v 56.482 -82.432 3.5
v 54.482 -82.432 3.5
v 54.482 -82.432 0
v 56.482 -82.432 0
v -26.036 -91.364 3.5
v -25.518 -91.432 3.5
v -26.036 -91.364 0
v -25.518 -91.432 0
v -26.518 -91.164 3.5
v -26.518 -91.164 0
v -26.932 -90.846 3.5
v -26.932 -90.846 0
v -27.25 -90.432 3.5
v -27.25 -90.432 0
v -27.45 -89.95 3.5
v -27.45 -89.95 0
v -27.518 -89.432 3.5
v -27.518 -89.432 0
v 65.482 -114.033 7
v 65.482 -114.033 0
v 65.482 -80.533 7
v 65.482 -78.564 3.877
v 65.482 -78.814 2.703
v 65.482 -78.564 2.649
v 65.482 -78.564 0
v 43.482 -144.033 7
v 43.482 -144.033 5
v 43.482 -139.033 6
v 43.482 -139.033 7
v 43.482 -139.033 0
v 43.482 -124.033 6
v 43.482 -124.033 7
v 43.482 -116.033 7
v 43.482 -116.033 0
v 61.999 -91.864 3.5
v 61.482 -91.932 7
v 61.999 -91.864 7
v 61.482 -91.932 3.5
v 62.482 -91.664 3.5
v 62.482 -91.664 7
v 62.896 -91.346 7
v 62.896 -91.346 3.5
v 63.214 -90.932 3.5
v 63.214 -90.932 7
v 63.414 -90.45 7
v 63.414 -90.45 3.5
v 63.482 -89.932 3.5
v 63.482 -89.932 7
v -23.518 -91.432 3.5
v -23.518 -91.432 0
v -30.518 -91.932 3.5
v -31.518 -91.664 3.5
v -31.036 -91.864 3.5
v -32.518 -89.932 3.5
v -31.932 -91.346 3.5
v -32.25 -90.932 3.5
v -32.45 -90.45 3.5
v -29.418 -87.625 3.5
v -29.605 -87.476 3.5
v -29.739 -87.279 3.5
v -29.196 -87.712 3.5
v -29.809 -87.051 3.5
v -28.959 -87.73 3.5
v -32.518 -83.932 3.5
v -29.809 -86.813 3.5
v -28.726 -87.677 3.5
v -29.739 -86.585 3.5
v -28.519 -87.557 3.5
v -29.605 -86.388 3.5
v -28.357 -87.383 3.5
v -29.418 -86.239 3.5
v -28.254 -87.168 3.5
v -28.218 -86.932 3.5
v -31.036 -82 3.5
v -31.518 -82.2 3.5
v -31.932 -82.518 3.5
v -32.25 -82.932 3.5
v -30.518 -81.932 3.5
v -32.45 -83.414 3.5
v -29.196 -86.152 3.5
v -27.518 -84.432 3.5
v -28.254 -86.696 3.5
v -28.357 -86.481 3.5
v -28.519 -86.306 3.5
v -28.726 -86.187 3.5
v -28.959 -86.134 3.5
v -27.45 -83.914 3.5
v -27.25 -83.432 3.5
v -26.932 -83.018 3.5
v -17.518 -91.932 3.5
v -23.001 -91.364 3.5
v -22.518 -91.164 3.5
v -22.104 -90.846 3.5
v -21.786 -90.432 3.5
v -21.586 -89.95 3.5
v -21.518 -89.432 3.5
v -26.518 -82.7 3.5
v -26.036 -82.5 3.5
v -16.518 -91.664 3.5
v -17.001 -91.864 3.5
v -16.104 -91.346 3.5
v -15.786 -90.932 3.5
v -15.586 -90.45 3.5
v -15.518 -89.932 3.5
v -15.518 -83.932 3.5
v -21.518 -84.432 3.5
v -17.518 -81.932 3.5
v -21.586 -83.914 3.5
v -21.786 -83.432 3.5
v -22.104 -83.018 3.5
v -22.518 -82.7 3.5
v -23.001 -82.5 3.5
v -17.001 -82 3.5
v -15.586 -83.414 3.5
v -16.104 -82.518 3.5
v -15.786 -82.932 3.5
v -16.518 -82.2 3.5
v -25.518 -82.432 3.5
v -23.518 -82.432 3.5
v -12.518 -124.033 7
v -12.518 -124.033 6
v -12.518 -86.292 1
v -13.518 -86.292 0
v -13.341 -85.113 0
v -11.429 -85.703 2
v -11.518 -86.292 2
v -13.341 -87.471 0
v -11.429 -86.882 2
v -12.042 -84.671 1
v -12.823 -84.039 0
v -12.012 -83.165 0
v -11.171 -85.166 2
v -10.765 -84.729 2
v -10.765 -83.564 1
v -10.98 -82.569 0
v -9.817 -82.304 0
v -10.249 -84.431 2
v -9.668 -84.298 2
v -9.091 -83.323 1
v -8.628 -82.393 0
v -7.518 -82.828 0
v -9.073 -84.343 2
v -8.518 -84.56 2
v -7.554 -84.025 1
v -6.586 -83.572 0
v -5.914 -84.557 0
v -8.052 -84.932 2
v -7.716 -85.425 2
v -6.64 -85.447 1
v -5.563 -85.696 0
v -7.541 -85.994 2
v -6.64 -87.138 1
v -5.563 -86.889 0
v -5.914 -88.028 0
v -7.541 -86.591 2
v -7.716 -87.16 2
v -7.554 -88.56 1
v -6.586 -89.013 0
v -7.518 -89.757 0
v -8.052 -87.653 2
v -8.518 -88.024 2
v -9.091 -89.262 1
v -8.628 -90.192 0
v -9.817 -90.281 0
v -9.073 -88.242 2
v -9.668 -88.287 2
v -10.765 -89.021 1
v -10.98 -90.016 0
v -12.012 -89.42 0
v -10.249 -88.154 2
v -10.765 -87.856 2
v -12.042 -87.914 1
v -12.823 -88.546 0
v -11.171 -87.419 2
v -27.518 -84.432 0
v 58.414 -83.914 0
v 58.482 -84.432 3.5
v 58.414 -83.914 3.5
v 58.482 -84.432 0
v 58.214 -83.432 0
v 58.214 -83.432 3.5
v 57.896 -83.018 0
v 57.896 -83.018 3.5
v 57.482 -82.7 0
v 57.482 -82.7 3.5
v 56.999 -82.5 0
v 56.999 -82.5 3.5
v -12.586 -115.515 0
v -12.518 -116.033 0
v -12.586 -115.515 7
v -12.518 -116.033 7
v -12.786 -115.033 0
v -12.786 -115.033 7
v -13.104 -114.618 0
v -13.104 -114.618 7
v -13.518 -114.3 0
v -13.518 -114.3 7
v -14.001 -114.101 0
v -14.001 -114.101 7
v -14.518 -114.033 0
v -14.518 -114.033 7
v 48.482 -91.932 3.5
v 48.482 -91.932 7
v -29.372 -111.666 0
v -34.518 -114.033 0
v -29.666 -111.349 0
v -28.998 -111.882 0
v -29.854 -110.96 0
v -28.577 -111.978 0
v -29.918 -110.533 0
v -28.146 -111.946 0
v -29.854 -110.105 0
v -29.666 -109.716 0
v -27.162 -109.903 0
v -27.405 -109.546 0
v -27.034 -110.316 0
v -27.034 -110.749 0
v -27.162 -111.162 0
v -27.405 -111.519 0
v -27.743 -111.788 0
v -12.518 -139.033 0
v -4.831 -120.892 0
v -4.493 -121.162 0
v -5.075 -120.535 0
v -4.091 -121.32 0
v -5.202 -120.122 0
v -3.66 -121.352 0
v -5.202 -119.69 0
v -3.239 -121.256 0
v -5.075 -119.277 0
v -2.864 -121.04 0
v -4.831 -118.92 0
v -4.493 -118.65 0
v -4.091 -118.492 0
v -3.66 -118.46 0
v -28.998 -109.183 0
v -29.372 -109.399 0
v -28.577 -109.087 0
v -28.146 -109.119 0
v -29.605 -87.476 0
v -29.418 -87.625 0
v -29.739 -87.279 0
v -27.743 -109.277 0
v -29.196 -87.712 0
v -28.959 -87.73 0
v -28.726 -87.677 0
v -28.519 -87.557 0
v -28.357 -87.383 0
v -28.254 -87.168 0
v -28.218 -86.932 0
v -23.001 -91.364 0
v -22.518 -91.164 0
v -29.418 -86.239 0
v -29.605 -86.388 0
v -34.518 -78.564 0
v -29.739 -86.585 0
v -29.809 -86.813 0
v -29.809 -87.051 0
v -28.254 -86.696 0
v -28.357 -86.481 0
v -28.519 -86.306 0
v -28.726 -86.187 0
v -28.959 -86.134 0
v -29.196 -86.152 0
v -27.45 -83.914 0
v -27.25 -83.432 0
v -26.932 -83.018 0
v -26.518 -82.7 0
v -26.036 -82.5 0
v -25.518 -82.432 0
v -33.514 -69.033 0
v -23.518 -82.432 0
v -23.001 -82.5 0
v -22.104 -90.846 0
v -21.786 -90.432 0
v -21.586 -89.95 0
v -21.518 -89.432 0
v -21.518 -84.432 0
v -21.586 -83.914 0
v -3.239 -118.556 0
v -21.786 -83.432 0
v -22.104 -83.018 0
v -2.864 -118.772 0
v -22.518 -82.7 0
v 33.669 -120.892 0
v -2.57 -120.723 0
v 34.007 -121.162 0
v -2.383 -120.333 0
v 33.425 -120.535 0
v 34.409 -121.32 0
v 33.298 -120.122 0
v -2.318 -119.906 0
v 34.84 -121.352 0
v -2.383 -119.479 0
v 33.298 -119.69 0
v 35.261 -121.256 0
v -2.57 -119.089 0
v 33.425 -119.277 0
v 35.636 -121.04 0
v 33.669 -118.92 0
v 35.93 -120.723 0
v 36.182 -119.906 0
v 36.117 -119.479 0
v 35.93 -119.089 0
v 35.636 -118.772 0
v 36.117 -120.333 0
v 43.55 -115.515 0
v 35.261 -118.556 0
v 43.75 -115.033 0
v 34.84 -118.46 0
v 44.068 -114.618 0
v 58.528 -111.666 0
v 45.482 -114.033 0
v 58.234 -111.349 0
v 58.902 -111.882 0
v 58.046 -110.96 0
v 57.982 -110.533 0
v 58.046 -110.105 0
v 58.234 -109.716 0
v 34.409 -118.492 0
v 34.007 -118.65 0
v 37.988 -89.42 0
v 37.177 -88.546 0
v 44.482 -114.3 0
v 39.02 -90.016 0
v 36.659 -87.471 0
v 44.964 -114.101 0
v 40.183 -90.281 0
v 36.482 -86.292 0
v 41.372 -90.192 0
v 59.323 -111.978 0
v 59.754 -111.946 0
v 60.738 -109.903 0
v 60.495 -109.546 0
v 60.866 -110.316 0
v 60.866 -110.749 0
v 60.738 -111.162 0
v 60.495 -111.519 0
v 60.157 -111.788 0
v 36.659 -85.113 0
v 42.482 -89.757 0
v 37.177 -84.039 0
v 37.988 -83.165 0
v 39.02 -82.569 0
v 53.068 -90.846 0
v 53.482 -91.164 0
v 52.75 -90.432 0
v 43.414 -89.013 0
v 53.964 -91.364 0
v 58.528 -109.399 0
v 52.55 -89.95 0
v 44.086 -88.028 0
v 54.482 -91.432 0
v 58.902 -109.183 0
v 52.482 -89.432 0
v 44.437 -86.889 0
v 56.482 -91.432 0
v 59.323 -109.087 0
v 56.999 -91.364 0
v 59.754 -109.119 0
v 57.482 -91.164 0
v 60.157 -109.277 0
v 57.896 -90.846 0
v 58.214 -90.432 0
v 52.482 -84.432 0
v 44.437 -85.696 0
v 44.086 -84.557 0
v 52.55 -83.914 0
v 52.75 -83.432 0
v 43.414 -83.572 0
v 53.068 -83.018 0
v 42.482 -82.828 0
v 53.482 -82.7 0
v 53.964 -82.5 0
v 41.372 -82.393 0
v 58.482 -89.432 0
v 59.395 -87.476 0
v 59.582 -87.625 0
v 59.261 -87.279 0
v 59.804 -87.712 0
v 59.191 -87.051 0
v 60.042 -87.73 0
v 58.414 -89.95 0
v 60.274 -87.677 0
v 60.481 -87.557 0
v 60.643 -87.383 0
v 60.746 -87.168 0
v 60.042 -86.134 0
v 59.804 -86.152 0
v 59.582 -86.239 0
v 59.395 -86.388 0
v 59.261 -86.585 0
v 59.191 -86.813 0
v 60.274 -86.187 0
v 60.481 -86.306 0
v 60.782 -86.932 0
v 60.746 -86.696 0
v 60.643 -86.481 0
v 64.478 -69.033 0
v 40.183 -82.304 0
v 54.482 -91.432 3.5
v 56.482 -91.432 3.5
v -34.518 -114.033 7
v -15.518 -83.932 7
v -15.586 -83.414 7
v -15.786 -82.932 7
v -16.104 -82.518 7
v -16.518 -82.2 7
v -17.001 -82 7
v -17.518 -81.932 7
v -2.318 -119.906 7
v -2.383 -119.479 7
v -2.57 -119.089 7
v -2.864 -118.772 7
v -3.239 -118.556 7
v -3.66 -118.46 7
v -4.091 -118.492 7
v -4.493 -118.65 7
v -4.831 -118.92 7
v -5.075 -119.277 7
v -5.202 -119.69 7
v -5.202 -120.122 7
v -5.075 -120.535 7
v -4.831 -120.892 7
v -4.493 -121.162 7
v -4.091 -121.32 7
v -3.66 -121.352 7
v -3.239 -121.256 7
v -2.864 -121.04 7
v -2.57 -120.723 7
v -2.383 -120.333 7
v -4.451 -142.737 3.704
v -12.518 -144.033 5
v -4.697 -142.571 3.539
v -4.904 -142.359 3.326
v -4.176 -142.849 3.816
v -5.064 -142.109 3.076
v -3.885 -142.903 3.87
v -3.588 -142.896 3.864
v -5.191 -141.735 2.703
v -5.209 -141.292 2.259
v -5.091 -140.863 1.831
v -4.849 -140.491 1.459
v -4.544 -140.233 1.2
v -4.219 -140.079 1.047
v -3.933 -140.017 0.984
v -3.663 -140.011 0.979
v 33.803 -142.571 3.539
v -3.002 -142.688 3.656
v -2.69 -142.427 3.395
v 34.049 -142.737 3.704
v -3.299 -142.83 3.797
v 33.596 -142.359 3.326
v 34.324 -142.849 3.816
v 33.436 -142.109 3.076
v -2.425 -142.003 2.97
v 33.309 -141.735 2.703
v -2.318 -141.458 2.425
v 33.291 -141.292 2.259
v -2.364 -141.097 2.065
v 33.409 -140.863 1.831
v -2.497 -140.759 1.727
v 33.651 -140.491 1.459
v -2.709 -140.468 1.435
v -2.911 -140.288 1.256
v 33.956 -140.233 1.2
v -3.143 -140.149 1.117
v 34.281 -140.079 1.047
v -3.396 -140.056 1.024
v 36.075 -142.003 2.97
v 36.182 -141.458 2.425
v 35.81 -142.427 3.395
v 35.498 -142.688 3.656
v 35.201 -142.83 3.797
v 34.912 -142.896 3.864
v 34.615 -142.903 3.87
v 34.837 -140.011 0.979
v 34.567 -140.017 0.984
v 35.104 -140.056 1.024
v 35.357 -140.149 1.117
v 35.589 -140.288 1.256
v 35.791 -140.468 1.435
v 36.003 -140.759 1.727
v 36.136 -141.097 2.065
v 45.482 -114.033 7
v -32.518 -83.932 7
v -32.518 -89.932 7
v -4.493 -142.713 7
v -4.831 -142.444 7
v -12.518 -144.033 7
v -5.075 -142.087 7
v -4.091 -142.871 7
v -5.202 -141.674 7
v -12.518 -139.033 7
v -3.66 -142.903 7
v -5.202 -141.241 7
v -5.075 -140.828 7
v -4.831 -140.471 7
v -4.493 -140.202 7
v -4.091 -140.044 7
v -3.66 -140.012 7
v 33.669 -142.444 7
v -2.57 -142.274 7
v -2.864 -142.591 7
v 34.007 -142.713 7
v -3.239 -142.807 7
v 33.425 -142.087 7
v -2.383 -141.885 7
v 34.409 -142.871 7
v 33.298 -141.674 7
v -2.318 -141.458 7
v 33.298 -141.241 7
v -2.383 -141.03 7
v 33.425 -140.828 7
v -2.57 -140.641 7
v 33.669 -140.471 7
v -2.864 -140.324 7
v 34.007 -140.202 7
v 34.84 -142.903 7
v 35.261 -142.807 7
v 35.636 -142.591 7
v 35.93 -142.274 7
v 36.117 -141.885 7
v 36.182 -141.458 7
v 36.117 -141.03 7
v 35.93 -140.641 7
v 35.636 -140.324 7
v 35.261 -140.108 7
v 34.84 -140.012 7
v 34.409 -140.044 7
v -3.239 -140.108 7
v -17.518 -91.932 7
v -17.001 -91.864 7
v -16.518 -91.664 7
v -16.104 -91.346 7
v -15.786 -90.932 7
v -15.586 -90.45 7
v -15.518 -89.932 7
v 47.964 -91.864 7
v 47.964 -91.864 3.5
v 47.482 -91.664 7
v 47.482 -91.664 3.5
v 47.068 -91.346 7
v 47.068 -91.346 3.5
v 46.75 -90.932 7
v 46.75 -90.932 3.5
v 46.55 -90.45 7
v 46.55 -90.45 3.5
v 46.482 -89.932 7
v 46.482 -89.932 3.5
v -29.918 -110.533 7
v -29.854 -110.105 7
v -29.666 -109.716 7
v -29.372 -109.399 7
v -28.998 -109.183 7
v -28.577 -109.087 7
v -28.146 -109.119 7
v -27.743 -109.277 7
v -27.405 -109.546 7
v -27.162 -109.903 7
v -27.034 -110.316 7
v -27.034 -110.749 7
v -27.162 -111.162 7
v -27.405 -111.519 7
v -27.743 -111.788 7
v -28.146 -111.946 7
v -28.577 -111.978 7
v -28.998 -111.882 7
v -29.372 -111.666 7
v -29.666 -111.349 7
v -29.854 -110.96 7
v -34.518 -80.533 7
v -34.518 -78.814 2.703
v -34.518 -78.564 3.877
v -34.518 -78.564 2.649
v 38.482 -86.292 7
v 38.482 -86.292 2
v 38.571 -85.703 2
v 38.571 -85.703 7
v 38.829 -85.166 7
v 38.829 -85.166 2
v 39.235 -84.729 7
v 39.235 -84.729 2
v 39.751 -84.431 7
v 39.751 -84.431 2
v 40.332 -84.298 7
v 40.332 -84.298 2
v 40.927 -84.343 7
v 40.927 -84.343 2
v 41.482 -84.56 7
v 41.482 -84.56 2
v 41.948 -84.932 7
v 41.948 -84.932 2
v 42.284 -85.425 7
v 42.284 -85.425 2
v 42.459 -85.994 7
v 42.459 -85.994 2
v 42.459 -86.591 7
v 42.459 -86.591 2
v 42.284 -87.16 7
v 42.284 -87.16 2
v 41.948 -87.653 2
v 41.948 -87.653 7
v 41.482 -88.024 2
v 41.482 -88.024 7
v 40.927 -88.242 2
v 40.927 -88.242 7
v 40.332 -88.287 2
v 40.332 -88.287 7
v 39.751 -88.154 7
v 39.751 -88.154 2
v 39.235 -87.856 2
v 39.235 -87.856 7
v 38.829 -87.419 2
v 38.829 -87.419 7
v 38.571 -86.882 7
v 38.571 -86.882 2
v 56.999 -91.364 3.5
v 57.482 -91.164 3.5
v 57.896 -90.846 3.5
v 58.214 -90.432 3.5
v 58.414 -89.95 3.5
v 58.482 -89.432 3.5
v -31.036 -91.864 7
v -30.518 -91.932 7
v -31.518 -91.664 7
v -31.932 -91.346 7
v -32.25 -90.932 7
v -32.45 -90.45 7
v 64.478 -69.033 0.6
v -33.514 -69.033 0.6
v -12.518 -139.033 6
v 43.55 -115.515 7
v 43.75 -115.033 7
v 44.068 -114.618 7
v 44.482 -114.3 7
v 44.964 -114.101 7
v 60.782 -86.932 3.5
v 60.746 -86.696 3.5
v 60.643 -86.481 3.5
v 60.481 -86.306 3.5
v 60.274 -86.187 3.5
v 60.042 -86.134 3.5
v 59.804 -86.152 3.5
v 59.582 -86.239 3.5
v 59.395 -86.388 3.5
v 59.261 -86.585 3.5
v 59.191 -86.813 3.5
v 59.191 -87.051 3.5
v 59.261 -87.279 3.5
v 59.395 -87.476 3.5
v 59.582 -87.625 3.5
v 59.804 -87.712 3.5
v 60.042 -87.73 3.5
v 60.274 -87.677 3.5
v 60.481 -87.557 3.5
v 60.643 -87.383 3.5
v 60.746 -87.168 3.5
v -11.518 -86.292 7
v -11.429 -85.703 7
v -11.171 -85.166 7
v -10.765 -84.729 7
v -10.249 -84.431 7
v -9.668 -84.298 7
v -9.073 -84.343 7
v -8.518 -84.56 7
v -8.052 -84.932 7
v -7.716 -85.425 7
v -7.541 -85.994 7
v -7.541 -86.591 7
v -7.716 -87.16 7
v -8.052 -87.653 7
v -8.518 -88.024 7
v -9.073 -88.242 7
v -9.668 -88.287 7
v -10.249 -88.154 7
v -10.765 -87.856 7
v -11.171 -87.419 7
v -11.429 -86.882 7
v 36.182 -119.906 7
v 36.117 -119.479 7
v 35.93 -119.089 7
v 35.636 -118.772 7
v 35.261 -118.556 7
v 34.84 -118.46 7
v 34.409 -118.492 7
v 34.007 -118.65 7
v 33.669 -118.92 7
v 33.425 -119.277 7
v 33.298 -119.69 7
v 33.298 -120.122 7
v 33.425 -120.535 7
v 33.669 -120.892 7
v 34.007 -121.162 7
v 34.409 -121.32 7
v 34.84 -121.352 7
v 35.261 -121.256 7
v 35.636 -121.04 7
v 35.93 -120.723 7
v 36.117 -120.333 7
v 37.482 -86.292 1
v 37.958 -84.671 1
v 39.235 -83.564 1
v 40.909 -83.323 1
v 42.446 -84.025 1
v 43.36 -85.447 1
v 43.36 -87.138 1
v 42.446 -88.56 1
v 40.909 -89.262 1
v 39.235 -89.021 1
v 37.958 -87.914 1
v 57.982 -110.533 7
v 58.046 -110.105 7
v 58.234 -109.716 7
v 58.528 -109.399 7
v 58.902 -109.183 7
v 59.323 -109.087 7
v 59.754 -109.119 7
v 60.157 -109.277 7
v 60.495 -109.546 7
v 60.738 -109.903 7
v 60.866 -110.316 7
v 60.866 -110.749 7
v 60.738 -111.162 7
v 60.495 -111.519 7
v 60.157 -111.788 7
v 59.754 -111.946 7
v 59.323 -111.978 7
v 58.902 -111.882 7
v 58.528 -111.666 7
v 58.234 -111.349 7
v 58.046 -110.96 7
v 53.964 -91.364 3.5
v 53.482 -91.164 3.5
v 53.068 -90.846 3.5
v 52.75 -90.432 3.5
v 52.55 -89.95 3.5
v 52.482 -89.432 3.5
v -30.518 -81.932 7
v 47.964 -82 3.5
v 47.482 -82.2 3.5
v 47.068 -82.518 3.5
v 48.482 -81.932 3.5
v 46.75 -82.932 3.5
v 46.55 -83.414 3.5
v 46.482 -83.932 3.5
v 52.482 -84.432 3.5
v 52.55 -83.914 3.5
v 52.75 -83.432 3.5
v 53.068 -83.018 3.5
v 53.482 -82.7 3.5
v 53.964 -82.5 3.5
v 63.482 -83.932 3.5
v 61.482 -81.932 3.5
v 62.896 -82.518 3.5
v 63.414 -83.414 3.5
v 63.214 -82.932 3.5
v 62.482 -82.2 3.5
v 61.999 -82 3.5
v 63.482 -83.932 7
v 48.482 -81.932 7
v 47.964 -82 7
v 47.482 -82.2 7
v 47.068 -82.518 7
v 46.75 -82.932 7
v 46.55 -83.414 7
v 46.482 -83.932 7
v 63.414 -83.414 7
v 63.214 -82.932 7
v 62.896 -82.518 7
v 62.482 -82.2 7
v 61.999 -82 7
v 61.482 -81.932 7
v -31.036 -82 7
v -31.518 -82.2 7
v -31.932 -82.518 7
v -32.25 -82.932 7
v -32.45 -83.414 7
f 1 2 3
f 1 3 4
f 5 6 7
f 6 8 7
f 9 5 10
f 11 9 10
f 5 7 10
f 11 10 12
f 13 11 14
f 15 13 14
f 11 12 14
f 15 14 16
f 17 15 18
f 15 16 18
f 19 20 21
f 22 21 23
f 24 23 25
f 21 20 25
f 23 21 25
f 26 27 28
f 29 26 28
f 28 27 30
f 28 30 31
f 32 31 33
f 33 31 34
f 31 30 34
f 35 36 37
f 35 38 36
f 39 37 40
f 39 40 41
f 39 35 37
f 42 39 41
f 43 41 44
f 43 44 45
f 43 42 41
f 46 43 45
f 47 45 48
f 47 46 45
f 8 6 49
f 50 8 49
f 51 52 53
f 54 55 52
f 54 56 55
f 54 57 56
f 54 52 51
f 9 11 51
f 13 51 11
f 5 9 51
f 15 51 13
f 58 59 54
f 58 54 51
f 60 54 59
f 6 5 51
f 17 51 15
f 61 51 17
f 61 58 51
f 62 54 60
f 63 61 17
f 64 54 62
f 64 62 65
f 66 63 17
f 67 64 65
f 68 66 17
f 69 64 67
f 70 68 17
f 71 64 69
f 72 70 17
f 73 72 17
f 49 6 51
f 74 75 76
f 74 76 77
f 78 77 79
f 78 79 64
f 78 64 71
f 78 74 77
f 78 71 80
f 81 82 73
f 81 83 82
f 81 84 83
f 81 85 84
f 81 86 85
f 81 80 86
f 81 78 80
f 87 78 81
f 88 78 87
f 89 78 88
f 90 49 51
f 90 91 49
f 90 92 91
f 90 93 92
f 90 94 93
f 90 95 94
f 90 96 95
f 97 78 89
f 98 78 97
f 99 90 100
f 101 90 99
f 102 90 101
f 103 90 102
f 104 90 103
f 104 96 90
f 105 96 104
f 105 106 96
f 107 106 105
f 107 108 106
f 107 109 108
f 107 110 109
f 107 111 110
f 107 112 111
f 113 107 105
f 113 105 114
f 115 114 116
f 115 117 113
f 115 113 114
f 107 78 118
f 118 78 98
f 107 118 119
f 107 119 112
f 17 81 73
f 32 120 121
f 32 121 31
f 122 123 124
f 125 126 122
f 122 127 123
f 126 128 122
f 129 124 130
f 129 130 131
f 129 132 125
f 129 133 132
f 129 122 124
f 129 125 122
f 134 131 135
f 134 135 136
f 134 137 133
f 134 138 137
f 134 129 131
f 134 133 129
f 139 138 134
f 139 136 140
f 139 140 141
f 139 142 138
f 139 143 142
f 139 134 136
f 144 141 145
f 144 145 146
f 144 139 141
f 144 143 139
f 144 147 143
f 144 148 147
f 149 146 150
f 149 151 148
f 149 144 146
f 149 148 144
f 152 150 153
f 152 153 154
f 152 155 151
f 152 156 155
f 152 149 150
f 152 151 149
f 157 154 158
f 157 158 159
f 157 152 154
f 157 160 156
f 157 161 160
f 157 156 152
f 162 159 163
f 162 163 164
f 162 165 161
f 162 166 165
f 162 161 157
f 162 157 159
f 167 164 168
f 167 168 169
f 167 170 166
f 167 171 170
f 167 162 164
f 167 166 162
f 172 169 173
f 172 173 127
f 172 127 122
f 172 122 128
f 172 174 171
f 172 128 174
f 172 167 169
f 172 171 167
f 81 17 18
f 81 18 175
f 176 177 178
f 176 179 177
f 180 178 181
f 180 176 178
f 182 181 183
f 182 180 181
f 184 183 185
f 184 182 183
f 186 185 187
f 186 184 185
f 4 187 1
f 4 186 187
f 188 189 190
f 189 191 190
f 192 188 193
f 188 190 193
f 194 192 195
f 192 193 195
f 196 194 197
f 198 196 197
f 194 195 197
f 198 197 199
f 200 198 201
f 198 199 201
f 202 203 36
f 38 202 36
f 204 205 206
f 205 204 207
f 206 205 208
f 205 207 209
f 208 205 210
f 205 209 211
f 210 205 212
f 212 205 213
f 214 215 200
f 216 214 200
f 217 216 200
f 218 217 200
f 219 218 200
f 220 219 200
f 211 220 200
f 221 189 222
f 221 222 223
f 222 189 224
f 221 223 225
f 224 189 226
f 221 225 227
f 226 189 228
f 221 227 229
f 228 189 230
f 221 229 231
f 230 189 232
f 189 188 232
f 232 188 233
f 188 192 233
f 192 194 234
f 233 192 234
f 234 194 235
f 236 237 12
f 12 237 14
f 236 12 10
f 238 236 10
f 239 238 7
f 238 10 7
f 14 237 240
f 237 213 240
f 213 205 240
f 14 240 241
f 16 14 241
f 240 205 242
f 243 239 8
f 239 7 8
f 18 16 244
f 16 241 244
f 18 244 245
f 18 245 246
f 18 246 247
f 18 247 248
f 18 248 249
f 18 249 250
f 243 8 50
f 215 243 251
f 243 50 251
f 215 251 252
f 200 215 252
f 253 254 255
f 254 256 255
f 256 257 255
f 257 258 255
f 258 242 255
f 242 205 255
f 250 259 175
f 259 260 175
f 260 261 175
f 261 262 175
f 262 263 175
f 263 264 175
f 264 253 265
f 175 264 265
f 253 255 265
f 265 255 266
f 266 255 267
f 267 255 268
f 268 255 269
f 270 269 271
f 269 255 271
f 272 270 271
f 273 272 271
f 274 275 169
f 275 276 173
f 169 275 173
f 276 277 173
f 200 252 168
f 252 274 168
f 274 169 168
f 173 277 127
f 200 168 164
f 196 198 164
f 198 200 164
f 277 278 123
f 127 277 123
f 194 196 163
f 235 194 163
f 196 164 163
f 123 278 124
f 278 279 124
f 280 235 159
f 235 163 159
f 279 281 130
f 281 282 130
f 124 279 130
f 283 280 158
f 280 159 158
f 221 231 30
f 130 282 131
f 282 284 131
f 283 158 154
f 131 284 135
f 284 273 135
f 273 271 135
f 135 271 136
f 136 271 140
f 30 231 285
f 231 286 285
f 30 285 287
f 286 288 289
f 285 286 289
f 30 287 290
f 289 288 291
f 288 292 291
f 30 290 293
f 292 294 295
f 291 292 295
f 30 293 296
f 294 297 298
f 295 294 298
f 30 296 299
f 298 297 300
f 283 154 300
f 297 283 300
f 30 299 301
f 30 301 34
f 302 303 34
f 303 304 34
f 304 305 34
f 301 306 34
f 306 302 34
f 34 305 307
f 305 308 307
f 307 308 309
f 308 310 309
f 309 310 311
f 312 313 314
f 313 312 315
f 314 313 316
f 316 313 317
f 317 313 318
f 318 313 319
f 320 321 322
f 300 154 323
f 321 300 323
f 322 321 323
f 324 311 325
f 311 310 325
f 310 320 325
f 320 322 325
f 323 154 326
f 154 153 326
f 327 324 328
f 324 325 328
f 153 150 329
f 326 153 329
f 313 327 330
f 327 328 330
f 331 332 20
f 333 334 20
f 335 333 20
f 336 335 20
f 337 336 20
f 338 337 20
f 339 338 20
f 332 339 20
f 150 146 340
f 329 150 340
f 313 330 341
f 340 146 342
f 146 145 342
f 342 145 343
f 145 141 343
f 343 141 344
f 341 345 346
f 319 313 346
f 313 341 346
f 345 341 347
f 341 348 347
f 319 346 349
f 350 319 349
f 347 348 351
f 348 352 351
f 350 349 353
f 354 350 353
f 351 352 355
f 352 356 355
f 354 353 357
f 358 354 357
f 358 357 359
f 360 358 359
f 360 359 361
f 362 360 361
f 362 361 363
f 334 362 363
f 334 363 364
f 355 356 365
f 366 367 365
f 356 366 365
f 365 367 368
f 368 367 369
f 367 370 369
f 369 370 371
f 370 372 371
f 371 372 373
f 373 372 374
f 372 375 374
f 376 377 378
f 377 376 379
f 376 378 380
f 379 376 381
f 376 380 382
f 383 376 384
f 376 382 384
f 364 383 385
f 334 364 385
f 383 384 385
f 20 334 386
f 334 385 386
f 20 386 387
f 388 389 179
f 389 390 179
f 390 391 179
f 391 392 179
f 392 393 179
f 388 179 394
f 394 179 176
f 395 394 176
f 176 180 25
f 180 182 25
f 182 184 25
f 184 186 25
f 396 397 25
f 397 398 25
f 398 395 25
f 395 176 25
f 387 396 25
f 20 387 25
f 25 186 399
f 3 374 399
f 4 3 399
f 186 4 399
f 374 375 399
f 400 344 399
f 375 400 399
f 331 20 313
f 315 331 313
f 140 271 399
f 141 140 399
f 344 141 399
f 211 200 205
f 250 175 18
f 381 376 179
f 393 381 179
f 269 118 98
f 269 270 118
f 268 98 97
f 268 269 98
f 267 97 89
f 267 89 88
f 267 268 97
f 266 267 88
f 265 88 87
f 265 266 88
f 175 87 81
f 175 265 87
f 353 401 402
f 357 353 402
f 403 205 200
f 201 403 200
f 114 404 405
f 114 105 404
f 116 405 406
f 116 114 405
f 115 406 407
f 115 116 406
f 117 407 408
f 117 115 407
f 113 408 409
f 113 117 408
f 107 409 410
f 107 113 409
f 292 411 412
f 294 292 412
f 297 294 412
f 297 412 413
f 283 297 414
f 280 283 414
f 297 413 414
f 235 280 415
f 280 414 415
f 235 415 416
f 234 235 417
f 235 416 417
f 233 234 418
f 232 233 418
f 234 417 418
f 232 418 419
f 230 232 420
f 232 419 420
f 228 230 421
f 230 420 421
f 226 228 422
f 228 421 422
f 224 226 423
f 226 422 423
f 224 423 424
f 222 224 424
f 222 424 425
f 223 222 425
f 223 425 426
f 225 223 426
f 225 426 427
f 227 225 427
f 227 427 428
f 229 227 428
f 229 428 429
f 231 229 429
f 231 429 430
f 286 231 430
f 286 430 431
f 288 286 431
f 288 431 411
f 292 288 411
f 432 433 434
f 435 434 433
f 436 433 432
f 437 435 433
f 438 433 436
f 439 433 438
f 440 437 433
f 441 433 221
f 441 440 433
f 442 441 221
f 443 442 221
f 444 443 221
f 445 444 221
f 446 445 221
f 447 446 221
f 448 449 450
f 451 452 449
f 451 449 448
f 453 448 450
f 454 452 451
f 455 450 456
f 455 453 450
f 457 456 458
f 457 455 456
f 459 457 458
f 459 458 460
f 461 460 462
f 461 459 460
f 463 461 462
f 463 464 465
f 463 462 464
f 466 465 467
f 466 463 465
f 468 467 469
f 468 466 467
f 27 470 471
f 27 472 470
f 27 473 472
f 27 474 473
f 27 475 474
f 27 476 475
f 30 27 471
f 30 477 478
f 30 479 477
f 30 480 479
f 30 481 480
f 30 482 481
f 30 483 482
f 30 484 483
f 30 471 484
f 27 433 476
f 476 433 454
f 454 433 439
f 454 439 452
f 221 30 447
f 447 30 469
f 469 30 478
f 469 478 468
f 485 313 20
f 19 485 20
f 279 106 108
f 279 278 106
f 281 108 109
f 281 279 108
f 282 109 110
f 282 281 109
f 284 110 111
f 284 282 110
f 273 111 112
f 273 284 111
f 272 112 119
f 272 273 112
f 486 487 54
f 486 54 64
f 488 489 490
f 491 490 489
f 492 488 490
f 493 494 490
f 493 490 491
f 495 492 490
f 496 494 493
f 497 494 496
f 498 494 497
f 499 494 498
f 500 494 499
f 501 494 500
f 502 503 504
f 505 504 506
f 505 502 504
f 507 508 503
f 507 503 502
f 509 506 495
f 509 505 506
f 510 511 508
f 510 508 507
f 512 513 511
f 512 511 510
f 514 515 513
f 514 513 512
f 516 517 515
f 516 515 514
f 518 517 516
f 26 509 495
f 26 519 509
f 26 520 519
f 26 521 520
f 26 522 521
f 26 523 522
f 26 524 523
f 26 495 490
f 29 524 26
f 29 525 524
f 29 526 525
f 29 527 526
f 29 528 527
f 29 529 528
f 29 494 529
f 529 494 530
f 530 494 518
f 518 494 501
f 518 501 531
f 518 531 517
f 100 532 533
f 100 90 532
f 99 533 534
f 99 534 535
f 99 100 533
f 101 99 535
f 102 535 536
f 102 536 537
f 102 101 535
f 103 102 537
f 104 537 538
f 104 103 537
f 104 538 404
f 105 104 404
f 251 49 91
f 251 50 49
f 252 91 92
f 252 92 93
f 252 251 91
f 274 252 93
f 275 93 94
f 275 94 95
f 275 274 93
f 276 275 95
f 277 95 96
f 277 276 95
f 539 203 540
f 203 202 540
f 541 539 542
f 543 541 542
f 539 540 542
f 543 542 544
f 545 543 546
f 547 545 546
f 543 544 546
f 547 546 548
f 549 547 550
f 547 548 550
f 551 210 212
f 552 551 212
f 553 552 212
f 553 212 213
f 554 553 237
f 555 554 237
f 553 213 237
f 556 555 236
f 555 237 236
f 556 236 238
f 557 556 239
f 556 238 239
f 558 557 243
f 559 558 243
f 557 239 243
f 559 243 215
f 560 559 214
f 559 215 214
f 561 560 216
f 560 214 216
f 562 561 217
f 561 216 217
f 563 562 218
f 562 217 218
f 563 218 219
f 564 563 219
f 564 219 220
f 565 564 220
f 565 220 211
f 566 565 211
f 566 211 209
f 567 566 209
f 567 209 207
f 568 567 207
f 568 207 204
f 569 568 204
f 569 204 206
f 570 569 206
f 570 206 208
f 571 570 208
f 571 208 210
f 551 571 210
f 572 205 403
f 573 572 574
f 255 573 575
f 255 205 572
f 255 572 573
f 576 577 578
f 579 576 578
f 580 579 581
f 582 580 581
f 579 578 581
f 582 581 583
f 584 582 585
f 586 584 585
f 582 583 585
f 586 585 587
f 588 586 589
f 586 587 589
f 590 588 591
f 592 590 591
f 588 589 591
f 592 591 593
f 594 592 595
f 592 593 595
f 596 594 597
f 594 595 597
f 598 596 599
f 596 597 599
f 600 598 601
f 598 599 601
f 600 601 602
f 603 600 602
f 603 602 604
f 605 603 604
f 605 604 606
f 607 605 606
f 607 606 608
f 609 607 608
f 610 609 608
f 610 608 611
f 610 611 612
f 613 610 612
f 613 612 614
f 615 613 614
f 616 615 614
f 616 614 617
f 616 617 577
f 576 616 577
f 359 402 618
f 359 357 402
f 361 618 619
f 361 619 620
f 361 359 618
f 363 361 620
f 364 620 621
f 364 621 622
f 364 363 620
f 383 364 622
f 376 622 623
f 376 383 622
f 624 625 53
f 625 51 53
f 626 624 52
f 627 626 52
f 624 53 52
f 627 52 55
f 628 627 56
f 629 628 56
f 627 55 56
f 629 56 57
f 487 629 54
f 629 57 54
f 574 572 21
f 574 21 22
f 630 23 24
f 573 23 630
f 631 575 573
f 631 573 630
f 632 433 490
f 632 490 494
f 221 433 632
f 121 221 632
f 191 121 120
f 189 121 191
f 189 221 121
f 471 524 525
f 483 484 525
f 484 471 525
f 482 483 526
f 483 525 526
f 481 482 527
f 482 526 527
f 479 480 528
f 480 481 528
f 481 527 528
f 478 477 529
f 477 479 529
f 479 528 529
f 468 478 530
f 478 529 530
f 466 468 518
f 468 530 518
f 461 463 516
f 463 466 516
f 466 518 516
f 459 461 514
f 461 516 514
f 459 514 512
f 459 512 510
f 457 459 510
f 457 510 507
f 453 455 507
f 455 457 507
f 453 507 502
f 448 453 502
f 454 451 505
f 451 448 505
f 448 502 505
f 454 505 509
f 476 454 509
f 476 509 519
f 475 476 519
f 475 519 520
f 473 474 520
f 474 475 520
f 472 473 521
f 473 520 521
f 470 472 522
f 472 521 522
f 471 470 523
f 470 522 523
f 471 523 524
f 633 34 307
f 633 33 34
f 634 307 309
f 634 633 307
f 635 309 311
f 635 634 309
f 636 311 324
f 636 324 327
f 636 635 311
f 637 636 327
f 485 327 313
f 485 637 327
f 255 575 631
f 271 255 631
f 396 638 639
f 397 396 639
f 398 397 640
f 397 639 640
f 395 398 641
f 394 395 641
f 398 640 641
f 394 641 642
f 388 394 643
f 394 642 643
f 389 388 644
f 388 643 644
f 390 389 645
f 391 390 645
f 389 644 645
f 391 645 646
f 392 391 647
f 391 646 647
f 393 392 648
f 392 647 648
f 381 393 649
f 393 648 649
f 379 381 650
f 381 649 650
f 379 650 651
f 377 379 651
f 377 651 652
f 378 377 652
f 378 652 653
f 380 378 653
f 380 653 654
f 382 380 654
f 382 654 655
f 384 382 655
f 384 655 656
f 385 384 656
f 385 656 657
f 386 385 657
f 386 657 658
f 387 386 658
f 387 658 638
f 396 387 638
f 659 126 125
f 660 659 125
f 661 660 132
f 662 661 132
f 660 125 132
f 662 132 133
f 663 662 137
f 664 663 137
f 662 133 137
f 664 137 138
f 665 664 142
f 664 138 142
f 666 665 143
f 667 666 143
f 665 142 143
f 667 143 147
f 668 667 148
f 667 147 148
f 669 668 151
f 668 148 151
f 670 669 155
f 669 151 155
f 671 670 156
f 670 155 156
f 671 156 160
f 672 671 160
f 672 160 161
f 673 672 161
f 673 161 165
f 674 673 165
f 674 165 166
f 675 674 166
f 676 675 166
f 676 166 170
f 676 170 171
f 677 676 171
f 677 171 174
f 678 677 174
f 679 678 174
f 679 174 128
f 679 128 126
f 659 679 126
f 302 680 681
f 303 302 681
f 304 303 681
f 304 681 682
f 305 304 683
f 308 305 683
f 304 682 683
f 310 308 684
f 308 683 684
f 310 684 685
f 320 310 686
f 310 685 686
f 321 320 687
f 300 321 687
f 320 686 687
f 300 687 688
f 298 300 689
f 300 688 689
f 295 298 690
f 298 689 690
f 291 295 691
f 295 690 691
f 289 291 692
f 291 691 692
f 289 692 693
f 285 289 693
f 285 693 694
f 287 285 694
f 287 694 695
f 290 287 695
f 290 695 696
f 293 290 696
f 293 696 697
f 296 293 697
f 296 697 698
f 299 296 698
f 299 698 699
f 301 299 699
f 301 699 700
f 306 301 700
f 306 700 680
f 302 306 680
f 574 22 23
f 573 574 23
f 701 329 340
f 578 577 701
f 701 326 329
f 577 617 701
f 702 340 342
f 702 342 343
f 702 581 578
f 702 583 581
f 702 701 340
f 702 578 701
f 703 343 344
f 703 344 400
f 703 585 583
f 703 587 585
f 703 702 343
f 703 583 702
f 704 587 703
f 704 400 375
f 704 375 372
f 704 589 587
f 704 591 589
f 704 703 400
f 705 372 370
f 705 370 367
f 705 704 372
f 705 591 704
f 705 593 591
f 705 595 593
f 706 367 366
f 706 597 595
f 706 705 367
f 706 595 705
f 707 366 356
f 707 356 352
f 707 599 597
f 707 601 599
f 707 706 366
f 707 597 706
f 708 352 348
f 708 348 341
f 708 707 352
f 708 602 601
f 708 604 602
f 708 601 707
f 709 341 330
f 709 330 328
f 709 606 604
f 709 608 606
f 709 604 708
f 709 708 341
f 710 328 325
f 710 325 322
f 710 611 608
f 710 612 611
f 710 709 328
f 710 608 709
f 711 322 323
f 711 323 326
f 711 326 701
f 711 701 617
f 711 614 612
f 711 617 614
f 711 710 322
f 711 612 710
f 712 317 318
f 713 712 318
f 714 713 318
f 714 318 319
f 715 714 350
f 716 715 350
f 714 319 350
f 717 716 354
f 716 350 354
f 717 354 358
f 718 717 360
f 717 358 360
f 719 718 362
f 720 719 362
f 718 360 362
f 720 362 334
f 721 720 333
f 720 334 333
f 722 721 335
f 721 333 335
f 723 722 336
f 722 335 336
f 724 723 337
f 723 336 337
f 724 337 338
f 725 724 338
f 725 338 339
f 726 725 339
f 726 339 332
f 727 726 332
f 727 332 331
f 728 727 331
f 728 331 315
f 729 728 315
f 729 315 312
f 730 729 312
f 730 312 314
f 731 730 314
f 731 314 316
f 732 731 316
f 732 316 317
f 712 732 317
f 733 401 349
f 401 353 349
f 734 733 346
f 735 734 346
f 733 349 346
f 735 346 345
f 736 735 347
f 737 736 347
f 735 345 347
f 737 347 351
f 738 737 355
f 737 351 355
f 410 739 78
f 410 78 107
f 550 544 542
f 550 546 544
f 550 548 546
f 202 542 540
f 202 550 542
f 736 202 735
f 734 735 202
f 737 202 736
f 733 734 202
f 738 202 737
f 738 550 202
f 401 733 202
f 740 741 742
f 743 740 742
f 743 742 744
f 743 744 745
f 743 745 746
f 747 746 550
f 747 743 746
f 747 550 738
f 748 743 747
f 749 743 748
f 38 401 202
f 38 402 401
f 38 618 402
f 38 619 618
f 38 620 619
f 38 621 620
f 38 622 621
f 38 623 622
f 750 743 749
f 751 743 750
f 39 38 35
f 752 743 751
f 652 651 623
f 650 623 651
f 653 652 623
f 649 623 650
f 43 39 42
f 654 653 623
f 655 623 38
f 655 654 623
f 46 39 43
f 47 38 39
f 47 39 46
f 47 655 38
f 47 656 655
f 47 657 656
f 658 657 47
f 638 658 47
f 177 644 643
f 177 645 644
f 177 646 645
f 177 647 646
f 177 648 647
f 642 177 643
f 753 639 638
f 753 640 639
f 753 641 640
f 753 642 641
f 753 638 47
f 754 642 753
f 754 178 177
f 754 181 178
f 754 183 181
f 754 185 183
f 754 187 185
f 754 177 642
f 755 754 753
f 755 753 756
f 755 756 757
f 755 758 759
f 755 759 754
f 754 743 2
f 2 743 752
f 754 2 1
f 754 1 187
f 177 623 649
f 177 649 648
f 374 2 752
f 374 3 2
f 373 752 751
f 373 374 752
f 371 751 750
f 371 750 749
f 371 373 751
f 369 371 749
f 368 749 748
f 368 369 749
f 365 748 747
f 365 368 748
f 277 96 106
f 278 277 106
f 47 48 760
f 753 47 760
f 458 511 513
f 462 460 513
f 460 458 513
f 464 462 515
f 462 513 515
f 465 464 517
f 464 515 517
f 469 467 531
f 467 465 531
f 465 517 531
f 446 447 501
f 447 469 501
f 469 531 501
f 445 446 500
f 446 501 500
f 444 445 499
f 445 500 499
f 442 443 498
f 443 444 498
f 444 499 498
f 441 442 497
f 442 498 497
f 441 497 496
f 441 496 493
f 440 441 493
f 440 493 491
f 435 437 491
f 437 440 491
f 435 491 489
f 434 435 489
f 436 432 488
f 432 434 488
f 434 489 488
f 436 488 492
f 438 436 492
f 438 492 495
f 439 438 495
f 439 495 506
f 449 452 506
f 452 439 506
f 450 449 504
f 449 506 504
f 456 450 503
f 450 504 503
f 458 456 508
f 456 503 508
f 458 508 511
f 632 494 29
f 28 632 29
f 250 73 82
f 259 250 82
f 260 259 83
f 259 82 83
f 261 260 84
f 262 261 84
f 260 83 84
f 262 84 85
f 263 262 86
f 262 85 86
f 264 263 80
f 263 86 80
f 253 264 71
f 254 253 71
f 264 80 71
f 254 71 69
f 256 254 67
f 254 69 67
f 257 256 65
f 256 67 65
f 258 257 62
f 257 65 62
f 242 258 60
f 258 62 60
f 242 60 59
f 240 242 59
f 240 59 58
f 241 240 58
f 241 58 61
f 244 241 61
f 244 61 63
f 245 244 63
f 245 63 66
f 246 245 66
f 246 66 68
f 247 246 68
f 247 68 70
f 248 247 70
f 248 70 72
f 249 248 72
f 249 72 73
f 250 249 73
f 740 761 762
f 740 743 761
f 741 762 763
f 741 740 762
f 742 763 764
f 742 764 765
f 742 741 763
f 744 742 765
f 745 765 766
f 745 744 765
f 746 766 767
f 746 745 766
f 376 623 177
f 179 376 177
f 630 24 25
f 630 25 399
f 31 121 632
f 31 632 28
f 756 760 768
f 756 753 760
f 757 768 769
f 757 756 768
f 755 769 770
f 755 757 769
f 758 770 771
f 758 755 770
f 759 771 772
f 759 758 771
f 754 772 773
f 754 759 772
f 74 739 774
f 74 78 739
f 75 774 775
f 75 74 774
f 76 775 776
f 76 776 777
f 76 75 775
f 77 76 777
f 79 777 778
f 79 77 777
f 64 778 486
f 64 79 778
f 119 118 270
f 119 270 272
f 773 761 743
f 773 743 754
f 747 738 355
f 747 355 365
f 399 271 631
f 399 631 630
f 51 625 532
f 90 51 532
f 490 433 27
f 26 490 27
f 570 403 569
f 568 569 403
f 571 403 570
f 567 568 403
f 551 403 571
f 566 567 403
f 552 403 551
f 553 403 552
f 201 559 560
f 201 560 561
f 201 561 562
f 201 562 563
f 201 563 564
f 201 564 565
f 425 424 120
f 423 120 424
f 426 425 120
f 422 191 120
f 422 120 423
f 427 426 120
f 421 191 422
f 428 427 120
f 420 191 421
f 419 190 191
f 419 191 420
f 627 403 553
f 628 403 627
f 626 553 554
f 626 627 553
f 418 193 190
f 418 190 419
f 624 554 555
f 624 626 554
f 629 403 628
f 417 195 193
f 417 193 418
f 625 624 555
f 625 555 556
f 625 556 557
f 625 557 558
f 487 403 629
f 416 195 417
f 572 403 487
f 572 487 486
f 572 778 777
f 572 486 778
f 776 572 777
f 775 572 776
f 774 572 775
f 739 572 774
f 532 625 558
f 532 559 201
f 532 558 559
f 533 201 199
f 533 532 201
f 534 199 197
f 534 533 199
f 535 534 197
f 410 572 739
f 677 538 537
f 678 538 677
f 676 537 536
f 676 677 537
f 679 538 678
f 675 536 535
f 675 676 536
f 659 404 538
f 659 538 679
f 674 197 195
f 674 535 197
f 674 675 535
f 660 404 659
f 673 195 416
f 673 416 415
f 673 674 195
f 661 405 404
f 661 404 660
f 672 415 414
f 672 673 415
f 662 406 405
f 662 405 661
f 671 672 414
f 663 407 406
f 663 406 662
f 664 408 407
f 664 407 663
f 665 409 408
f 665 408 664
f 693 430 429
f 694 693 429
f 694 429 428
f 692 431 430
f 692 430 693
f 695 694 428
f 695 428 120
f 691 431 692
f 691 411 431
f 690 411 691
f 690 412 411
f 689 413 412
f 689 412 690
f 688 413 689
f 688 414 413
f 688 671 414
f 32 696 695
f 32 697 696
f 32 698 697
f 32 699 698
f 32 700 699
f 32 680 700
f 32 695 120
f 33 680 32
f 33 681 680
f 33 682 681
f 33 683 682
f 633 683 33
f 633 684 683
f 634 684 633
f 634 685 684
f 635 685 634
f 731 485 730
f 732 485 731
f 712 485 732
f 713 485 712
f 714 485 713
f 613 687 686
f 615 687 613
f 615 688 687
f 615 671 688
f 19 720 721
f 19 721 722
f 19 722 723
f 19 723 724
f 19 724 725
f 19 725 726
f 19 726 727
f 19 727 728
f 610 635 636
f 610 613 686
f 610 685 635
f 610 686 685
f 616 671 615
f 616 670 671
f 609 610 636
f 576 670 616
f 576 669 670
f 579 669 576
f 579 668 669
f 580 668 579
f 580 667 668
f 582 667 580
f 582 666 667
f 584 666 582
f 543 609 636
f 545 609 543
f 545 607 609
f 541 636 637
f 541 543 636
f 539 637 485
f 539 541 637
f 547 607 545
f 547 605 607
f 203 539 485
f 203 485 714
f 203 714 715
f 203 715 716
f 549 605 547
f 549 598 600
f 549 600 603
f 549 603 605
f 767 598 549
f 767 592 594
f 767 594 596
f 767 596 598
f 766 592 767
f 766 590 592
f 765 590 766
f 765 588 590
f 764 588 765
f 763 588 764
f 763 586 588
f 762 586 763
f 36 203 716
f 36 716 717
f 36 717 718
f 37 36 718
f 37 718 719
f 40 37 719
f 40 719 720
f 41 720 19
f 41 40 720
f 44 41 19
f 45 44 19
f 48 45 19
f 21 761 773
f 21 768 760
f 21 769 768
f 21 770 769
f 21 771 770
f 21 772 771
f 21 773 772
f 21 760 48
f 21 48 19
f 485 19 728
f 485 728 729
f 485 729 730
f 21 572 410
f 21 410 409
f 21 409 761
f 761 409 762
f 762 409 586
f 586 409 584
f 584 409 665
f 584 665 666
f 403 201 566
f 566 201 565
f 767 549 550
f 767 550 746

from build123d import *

# Parameters (mm, degrees)
ESBO_O1_W                = 56
ESBO_O1_H                = 30
ESBO_O1_W_2              = 100
ESBO_O1_H_2              = 45
RESSALTO_EXTRUS_O1_DEPTH = 7
CORTE_EXTRUS_O1_DEPTH    = 176.483223745
CORTE_EXTRUS_O2_DEPTH    = 164.946216229
ESBO_O5_W                = 17
ESBO_O5_H                = 10
CORTE_EXTRUS_O4_DEPTH    = 3.5
CORTE_EXTRUS_O6_DEPTH    = 24
FILETE1_R                = 2
FILETE2_R                = 2
ESBO_O8_R                = 0.8
ESBO_O8_W                = 6
ESBO_O8_H                = 9
CORTE_EXTRUS_O7_DEPTH    = 24
FILETE3_R                = 2
ESBO_O9_W                = 56
ESBO_O9_H                = 15
CORTE_EXTRUS_O8_DEPTH    = 1
ESBO_O10_R               = 1.45
CORTE_EXTRUS_O9_DEPTH    = 17
ESBO_O11_R               = 2
CORTE_EXTRUS_O10_DEPTH   = 15
CHANFRO1_SIZE            = 2
ESBO_O12_R               = 1.45
CORTE_EXTRUS_O11_DEPTH   = 15


with BuildPart() as part:
    # Esboço1 → Ressalto-extrusão1 (new body)
    with BuildSketch(Plane.XY):
        with Locations((15.481715893, -129.032502637)):
            Rectangle(ESBO_O1_W, ESBO_O1_H)
        with Locations((15.481715893, -91.532502637)):
            Rectangle(ESBO_O1_W_2, ESBO_O1_H_2)
    extrude(amount=RESSALTO_EXTRUS_O1_DEPTH)

    # Esboço2 → Corte-extrusão1 (cut, through all)
    with BuildSketch(Plane.ZY.offset(34.518284107)):
        Polygon((0.6, -69.032502637), (7, -69.032502637), (7, -80.532502637), (3.876629102, -78.564484615), (2.702851981, -78.813978644), align=None)
    extrude(amount=-CORTE_EXTRUS_O1_DEPTH, mode=Mode.SUBTRACT)

    # Esboço3 → Corte-extrusão2 (cut, through all)
    with BuildSketch(Plane(origin=(43.481715893, 0, 0), x_dir=(0, 0, -1), z_dir=(1, 0, 0))):
        Polygon((-5, -144.032502637), (0, -139.032502637), (0, -144.032502637), align=None)
    extrude(amount=-CORTE_EXTRUS_O2_DEPTH, mode=Mode.SUBTRACT)

    # Esboço5 → Corte-extrusão4 (cut)
    with BuildSketch(Plane.XY.offset(7)):
        with Locations((-24.018284107, -86.931905633)):
            Rectangle(ESBO_O5_W, ESBO_O5_H)
        with Locations((54.981715893, -86.931905633)):
            Rectangle(ESBO_O5_W, ESBO_O5_H)
    extrude(amount=-CORTE_EXTRUS_O4_DEPTH, mode=Mode.SUBTRACT)

    # Esboço7 → Corte-extrusão6 (cut)
    with BuildSketch(Plane.XY.offset(7)):
        Polygon((64.477557131, -69.032502637), (65.481715893, -69.032502637), (65.481715893, -78.564484615), align=None)
        Polygon((-34.518284107, -78.564484615), (-33.514125345, -69.032502637), (-34.518284107, -69.032502637), align=None)
    extrude(amount=-CORTE_EXTRUS_O6_DEPTH, mode=Mode.SUBTRACT)

    # Filete1
    filete1_edges = [part.edges().sort_by_distance(p)[0] for p in [
        (-32.518284107, -91.931905633, 5.25),
        (-32.518284107, -81.931905633, 5.25),
        (-15.518284107, -81.931905633, 5.25),
        (-15.518284107, -91.931905633, 5.25),
        (46.481715893, -91.931905633, 5.25),
        (46.481715893, -81.931905633, 5.25),
        (63.481715893, -81.931905633, 5.25),
        (63.481715893, -91.931905633, 5.25),
    ]]
    fillet(filete1_edges, radius=FILETE1_R)

    # Filete2
    filete2_edges = [part.edges().sort_by_distance(p)[0] for p in [
        (-12.518284107, -114.032502637, 3.5),
        (43.481715893, -114.032502637, 3.5),
    ]]
    fillet(filete2_edges, radius=FILETE2_R)

    # Esboço8 → Corte-extrusão7 (cut)
    with BuildSketch(Plane.XY.offset(7)):
        with Locations((59.981716293, -86.931906013)):
            Circle(ESBO_O8_R)
        with Locations((-29.018284507, -86.931905253)):
            Circle(ESBO_O8_R)
        with Locations((-24.518284107, -86.931905633)):
            Rectangle(ESBO_O8_W, ESBO_O8_H)
        with Locations((55.481715893, -86.931905633)):
            Rectangle(ESBO_O8_W, ESBO_O8_H)
    extrude(amount=-CORTE_EXTRUS_O7_DEPTH, mode=Mode.SUBTRACT)

    # Filete3
    filete3_edges = [part.edges().sort_by_distance(p)[0] for p in [
        (-27.518284107, -91.431905633, 1.75),
        (-27.518284107, -82.431905633, 1.75),
        (-21.518284107, -82.431905633, 1.75),
        (-21.518284107, -91.431905633, 1.75),
        (52.481715893, -91.431905633, 1.75),
        (52.481715893, -82.431905633, 1.75),
        (58.481715893, -82.431905633, 1.75),
        (58.481715893, -91.431905633, 1.75),
    ]]
    fillet(filete3_edges, radius=FILETE3_R)

    # Esboço9 → Corte-extrusão8 (cut)
    with BuildSketch(Plane.XY.offset(7)):
        with Locations((15.481715893, -131.532502637)):
            Rectangle(ESBO_O9_W, ESBO_O9_H)
    extrude(amount=-CORTE_EXTRUS_O8_DEPTH, mode=Mode.SUBTRACT)

    # Esboço10 → Corte-extrusão9 (cut)
    with BuildSketch(Plane.XY.offset(7)):
        with Locations((-3.768284107, -119.906030775)):
            Circle(ESBO_O10_R)
        with Locations((34.731715893, -119.906030775)):
            Circle(ESBO_O10_R)
        with Locations((34.731715893, -141.457502637)):
            Circle(ESBO_O10_R)
        with Locations((-3.768284107, -141.457502637)):
            Circle(ESBO_O10_R)
    extrude(amount=-CORTE_EXTRUS_O9_DEPTH, mode=Mode.SUBTRACT)

    # Esboço11 → Corte-extrusão10 (cut)
    with BuildSketch(Plane(origin=(0, 0, 0), x_dir=(-1, 0, 0), z_dir=(0, 0, -1))):
        with Locations((-40.481715893, -86.292423409)):
            Circle(ESBO_O11_R)
        with Locations((9.518284107, -86.292423409)):
            Circle(ESBO_O11_R)
    extrude(amount=-CORTE_EXTRUS_O10_DEPTH, mode=Mode.SUBTRACT)

    # Chanfro1
    chanfro1_edges = [part.edges().sort_by_distance(p)[0] for p in [
        (42.481715893, -86.292423409, 0),
        (-7.518284107, -86.292423409, 0),
    ]]
    chamfer(chanfro1_edges, length=CHANFRO1_SIZE)

    # Esboço12 → Corte-extrusão11 (cut)
    with BuildSketch(Plane(origin=(0, 0, 0), x_dir=(-1, 0, 0), z_dir=(0, 0, -1))):
        with Locations((-59.431715893, -110.532502637)):
            Circle(ESBO_O12_R)
        with Locations((28.468284107, -110.532502637)):
            Circle(ESBO_O12_R)
    extrude(amount=-CORTE_EXTRUS_O11_DEPTH, mode=Mode.SUBTRACT)


solid = part.part
